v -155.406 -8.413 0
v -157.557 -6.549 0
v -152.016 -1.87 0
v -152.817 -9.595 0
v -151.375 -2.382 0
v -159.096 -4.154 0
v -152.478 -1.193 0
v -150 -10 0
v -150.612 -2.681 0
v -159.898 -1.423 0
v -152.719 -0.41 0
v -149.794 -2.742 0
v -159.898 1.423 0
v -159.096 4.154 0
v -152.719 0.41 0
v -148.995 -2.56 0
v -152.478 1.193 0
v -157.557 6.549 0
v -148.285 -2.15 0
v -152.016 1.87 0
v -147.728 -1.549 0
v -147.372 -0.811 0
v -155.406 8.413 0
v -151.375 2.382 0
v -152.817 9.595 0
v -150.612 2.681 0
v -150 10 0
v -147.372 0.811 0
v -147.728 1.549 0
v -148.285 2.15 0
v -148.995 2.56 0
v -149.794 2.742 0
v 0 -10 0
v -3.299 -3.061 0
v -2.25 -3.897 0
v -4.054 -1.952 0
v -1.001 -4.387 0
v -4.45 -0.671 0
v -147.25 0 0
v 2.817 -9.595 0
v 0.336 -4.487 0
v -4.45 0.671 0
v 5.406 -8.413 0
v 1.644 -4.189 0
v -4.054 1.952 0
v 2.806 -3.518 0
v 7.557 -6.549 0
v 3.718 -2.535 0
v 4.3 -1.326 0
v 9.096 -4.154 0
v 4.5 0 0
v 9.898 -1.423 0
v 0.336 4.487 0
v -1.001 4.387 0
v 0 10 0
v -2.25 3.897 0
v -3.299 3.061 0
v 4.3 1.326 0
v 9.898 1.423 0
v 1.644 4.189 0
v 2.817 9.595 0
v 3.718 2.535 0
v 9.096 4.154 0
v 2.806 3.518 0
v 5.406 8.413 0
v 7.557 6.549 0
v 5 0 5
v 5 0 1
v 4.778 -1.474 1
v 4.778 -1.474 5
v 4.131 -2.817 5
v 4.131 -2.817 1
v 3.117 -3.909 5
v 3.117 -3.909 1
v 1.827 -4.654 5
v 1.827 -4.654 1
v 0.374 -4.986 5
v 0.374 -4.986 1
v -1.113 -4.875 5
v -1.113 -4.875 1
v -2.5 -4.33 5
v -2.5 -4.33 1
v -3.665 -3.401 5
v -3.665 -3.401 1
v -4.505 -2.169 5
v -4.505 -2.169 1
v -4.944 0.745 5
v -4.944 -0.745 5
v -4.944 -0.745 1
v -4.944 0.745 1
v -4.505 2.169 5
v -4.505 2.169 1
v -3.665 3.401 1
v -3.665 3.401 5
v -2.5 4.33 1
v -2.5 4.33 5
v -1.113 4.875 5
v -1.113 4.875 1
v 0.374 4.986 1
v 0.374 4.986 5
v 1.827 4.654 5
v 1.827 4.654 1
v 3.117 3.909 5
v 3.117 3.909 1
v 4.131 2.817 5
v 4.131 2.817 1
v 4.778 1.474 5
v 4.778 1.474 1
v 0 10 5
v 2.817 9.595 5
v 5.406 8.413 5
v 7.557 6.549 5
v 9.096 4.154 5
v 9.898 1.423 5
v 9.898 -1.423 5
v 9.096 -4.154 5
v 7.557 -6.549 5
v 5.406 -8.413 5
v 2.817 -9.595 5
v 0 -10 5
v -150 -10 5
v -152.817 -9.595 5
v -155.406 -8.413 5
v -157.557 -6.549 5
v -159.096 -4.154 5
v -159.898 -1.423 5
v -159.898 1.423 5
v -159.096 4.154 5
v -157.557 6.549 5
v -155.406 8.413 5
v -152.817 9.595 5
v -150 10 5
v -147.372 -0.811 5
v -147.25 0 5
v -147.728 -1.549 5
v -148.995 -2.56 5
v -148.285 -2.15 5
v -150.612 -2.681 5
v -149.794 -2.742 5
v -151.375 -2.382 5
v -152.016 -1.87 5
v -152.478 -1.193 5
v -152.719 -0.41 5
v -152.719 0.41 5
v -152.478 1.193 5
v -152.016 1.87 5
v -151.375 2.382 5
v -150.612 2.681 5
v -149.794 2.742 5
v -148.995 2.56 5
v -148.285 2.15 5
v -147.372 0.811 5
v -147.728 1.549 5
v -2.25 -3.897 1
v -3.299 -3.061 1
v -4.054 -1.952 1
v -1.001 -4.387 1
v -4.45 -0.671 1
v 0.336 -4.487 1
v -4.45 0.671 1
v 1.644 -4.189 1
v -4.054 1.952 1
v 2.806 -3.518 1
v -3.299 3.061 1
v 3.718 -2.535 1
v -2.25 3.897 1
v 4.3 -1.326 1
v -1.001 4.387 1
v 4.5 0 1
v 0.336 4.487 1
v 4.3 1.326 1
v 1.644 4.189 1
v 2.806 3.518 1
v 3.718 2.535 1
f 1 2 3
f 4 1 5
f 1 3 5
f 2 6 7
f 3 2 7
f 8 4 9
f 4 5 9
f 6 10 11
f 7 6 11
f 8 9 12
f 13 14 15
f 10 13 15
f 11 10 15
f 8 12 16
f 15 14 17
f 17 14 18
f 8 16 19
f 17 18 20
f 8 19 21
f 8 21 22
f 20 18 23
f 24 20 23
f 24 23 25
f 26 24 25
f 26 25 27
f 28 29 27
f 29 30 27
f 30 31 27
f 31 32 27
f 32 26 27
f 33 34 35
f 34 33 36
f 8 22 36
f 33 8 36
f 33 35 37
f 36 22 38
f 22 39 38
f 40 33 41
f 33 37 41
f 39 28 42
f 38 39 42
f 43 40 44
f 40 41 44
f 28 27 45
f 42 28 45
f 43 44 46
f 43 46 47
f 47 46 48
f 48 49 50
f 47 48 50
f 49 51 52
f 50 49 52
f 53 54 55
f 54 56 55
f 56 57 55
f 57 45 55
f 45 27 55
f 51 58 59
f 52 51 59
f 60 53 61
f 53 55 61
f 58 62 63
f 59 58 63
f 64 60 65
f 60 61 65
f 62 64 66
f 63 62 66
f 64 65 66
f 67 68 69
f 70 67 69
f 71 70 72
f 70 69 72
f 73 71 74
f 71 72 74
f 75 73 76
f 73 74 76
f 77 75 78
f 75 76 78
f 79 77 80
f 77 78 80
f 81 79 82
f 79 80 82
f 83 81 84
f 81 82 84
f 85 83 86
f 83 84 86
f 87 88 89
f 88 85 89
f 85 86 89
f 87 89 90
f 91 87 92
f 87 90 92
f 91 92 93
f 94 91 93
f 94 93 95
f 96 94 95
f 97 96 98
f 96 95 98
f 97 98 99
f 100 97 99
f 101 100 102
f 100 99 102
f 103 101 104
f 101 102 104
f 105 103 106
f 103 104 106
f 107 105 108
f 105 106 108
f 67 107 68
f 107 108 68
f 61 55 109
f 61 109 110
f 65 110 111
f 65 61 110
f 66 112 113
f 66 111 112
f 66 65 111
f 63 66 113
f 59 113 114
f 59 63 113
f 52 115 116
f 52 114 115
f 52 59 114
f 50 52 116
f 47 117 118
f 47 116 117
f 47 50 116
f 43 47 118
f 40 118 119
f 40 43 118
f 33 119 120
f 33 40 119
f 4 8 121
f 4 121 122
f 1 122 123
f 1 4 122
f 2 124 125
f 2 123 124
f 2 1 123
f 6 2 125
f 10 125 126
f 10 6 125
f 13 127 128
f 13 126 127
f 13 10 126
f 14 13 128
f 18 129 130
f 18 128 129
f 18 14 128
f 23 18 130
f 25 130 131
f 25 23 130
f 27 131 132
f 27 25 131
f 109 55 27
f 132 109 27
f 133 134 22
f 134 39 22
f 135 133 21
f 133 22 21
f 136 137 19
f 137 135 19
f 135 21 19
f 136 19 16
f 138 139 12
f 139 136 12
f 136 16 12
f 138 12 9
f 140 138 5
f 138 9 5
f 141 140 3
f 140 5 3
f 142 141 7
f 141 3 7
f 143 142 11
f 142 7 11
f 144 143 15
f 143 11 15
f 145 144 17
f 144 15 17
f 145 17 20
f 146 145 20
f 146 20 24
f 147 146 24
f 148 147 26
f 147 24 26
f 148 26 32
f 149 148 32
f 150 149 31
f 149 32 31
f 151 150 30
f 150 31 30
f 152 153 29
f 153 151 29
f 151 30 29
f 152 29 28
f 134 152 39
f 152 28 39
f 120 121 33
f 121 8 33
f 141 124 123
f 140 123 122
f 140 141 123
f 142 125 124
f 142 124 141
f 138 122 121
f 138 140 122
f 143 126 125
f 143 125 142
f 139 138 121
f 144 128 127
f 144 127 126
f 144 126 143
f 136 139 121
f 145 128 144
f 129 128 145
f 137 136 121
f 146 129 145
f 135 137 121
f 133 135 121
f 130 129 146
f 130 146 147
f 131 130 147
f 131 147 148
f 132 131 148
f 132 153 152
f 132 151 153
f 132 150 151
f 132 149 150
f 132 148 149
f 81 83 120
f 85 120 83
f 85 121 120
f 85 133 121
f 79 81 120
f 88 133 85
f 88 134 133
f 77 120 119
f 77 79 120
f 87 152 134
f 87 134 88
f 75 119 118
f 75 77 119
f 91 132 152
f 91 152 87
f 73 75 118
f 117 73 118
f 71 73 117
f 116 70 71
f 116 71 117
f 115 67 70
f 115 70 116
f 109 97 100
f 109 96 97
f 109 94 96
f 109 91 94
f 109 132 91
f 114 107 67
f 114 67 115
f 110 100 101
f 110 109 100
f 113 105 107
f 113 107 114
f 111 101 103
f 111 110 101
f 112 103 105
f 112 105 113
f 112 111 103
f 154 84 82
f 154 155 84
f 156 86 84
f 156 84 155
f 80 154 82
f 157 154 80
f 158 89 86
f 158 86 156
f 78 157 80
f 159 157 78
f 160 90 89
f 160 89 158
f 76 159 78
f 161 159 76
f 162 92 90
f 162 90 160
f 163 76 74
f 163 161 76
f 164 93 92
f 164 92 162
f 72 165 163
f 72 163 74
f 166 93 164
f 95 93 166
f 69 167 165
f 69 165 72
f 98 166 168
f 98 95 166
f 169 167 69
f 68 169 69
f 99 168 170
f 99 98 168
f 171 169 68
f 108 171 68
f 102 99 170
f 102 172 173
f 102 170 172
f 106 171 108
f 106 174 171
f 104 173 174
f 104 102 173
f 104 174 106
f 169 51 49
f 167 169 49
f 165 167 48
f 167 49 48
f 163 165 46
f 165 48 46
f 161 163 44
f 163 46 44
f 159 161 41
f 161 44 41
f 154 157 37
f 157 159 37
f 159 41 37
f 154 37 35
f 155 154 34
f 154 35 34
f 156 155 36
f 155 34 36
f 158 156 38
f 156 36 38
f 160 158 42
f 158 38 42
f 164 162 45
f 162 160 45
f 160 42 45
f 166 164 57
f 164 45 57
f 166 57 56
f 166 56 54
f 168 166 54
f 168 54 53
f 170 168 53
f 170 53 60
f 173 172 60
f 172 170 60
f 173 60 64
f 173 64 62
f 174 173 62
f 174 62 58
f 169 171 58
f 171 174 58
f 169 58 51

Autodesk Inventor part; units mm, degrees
ref_plane "YZ Plane" through (0, 0, 0) normal (1, 0, 0) x (0, 1, 0)
ref_plane "XZ Plane" through (0, 0, 0) normal (0, 1, 0) x (-1, 0, 0)
ref_plane "XY Plane" through (0, 0, 0) normal (0, 0, 1) x (1, 0, 0)
sketch "Skizze3" plane through (0, 0, 0) normal (0, 0, 1) x (1, 0, 0)
  line L0 (0, 0) -> (-150, 0) construction
  line L1 (0, 10) -> (-150, 10)
  line L2 (-150, -10) -> (0, -10)
  arc A0 (0, -10) -> (0, 10) centre (0, 0) ccw
  arc A1 (-150, 10) -> (-150, -10) centre (-150, 0) ccw
  circle A2 centre (0, 0) radius 5
  circle A3 centre (-150, 0) radius 2.75
  circle A4 centre (0, 0) radius 4.5
  point P0 (-75, 0)
  dimension "d4" = 150
  dimension "d5" = 20
  dimension "d6" = 10
  dimension "d7" = 5.5
  dimension "d12" = 9
extrude "Extrusion3" add sketch "Skizze3" along normal blind 5 contours A0 L2 A1 L1
extrude "Extrusion4" add sketch "Skizze3" along normal blind 1 contours A2
properties part number "BT001_trajan20_21" material "Kunststoff, undurchsichtig Schwarz"
